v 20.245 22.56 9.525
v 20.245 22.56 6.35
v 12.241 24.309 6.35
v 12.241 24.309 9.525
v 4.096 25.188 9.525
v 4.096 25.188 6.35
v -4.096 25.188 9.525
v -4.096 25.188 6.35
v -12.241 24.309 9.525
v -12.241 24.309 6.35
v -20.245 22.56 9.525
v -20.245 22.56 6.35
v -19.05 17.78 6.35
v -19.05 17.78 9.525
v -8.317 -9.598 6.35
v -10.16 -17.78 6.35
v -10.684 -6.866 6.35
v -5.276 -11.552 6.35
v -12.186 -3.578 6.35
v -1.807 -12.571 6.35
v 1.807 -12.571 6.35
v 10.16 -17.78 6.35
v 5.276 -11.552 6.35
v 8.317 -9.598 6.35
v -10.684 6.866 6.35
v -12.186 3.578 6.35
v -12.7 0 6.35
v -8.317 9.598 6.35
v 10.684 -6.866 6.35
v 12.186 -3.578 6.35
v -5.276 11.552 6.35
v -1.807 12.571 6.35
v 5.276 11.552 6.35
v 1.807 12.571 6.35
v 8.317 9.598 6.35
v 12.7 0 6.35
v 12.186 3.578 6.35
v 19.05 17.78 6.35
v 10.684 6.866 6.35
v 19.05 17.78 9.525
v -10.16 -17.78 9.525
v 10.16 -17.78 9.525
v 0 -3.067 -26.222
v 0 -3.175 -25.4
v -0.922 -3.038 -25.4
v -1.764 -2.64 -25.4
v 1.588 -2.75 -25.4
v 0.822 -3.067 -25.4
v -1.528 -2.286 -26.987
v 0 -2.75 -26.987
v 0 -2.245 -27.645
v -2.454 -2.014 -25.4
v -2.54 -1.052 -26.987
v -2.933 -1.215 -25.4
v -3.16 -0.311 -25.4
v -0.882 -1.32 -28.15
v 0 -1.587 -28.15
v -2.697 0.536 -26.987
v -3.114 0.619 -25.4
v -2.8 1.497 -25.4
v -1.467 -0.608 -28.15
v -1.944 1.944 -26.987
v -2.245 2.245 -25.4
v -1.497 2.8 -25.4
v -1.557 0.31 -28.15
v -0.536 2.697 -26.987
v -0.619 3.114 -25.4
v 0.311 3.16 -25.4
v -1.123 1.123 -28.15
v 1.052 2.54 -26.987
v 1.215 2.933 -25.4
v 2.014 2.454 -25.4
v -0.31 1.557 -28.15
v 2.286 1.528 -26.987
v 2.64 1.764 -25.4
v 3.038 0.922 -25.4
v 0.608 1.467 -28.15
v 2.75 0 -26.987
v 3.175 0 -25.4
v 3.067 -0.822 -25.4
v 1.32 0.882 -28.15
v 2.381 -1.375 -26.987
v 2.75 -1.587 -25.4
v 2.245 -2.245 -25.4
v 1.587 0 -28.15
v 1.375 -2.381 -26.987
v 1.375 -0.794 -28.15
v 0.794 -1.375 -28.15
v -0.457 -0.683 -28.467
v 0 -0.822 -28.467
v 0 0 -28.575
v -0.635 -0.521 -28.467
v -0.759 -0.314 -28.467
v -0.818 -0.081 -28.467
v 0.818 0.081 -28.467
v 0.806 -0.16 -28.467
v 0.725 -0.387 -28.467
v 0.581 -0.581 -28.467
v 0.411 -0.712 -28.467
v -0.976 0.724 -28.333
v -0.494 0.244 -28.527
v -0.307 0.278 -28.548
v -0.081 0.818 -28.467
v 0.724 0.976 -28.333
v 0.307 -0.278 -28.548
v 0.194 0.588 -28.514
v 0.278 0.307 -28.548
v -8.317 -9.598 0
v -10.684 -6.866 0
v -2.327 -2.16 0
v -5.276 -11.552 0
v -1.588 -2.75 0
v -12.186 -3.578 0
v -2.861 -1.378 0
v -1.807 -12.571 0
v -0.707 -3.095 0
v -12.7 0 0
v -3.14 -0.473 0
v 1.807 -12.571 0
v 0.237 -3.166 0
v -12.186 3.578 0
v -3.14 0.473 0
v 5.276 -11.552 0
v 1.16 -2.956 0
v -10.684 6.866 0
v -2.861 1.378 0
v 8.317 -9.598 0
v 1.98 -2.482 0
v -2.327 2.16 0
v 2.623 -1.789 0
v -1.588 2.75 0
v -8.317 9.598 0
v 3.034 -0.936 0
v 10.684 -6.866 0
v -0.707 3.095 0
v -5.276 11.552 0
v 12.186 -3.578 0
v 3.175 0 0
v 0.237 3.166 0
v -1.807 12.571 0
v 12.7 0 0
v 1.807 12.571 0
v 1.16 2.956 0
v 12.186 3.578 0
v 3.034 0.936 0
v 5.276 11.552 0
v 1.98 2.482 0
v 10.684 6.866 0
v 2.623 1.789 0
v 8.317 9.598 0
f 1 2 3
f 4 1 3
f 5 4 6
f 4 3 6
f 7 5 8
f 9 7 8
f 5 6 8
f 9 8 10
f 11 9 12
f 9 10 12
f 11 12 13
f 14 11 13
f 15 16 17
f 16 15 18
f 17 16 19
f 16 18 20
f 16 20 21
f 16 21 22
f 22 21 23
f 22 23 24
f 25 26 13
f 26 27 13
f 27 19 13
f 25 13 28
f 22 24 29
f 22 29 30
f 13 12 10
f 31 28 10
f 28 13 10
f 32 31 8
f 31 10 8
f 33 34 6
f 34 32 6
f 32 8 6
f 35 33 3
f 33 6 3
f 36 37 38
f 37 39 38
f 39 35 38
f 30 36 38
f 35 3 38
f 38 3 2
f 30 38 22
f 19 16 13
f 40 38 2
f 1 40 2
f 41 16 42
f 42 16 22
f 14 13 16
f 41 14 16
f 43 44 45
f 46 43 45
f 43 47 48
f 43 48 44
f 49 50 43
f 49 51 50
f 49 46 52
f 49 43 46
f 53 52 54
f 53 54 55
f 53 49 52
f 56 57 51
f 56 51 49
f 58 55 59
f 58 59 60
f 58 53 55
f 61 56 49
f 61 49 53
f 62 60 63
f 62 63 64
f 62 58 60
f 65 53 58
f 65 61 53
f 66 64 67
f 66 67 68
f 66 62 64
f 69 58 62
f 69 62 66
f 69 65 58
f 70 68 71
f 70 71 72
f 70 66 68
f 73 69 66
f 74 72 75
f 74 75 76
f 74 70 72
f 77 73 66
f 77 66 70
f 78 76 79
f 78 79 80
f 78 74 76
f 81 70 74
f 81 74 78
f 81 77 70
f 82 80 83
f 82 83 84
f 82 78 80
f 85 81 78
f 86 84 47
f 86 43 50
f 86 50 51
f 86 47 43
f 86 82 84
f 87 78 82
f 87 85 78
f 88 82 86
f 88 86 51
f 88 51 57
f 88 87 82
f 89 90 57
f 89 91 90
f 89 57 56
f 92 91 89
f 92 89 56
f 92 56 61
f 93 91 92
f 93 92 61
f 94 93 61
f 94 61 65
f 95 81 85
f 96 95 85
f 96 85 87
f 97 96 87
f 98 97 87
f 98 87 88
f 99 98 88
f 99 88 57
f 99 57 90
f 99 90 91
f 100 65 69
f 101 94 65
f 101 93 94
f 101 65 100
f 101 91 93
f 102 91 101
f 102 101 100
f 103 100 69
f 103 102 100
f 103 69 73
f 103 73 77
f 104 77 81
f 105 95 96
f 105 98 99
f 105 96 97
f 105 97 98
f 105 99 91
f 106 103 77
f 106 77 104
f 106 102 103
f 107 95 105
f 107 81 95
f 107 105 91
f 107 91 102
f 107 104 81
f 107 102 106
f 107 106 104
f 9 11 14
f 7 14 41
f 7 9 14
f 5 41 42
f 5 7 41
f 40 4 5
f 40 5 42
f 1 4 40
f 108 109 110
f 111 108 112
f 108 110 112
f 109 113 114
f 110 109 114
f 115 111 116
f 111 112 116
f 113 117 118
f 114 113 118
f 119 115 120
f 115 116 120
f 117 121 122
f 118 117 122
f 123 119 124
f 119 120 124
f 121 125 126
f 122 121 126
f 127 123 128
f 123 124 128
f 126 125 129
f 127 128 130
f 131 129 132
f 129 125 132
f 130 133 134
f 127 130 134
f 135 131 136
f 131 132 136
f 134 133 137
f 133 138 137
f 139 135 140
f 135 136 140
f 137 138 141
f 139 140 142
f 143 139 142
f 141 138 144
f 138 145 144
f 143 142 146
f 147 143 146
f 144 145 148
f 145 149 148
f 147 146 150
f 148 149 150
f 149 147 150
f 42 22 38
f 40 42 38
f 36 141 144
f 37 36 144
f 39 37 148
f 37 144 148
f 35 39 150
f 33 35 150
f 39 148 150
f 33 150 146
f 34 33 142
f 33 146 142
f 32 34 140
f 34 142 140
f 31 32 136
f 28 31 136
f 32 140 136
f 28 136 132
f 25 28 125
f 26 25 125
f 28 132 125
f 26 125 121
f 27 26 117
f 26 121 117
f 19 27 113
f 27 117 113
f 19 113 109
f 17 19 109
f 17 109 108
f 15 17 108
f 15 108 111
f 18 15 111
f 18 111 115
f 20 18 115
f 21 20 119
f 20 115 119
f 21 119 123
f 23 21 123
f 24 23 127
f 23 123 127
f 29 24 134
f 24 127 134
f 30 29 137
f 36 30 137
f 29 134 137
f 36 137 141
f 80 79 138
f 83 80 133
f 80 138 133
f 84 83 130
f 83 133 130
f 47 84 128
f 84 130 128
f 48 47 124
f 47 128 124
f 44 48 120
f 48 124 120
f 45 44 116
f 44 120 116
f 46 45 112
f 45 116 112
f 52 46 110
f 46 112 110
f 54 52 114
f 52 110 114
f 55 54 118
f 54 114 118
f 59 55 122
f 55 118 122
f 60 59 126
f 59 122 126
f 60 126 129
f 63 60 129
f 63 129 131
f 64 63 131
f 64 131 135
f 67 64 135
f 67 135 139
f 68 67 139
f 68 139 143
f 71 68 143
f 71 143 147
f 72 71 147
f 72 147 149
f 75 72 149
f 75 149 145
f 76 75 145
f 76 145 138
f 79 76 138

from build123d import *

# Parameters (mm, degrees)
F0_R     = 12.7
F1_DEPTH = 6.35
F2_R     = 3.175
F3_DEPTH = 25.4
F7_DEPTH = 3.175


with BuildPart() as f1:
    # F0 (on Top) → F1 (new body)
    with BuildSketch(Plane.XY):
        Circle(F0_R)
    extrude(amount=F1_DEPTH)

    # F2 (on face) → F3 (join)
    with BuildSketch(Plane(origin=(0, 0, 0), x_dir=(1, 0, 0), z_dir=(0, 0, -1))):
        Circle(F2_R)
    extrude(amount=F3_DEPTH)

    # F4 (on Right) → F5 (revolve)
    with BuildSketch(Plane.YZ):
        with BuildLine():
            Line((0, -28.575), (0, -25.4))
            Line((0, -25.4), (-3.175, -25.4))
            ThreePointArc((-3.175, -25.4), (-2.245064, -27.645064), (0, -28.575))
        make_face()
    revolve(axis=Axis((0, 0, -12.7), (0, 0, -1)))

    # F6 (on face) → F7 (join)
    with BuildSketch(Plane.XY.offset(6.35)):
        with BuildLine():
            Line((-10.16, -17.78), (0, -17.78))
            Line((0, -17.78), (10.16, -17.78))
            Line((10.16, -17.78), (19.05, 17.78))
            Line((19.05, 17.78), (20.244957, 22.55983))
            ThreePointArc((20.244957, 22.55983), (0, 25.2984), (-20.244957, 22.55983))
            Line((-20.244957, 22.55983), (-19.05, 17.78))
            Line((-19.05, 17.78), (-10.16, -17.78))
        make_face()
    extrude(amount=F7_DEPTH)


solid = f1.part
